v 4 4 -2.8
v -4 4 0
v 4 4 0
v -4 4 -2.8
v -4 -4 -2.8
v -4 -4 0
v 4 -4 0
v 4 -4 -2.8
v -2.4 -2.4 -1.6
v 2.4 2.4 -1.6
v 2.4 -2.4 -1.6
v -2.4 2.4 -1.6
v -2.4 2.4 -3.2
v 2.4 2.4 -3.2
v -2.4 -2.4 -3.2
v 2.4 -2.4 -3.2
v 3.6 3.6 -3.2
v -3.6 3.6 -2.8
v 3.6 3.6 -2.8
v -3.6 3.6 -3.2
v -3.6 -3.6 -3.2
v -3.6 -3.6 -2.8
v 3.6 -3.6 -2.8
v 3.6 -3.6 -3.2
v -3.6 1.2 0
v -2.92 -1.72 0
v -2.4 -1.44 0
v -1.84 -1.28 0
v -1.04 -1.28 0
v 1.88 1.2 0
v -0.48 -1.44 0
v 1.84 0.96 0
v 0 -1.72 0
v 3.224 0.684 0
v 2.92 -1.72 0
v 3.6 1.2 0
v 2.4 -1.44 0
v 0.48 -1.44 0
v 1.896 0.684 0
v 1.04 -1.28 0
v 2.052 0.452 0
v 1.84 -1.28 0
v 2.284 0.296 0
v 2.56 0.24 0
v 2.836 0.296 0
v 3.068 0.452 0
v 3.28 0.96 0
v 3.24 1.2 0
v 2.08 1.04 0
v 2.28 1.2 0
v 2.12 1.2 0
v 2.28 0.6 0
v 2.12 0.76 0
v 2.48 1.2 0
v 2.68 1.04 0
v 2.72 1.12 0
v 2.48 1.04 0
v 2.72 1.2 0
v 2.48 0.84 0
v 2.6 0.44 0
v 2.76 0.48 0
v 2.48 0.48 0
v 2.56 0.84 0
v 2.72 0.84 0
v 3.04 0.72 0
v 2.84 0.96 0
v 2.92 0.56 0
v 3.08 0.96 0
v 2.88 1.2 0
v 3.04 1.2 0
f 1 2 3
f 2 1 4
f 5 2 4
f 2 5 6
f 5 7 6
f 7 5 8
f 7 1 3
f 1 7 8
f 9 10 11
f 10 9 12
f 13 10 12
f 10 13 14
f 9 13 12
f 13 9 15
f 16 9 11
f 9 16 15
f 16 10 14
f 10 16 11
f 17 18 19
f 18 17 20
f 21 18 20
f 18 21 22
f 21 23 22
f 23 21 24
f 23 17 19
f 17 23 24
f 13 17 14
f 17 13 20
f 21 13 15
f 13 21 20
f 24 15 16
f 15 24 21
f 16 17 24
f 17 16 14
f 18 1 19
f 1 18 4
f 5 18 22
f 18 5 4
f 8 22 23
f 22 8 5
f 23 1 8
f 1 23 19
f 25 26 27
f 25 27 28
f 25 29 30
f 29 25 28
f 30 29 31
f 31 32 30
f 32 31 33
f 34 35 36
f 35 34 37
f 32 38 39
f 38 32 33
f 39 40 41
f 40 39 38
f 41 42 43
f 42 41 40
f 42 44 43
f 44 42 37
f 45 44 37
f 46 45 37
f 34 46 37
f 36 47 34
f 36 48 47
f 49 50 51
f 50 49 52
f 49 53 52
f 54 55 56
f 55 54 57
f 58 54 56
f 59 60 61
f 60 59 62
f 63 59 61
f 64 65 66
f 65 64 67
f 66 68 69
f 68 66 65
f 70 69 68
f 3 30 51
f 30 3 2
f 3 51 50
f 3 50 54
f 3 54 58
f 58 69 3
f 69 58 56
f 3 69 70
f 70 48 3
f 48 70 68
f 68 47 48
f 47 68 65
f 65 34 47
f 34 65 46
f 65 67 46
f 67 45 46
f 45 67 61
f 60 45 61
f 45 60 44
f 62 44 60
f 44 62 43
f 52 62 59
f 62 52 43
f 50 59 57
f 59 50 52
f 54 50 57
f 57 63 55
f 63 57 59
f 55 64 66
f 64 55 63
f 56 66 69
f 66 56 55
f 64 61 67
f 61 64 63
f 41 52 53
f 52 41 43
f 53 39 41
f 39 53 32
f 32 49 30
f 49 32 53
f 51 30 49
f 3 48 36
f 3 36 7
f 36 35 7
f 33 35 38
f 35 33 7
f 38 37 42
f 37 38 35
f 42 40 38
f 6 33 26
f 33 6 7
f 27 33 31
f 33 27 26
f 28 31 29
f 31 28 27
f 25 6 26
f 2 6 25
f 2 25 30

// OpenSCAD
// file: ../p/box5.scad
use <../lib.scad>
function ldraw_lib__box5() = [
// 0 Box with 5 Faces and All Edges
// 0 Name: box5.dat
// 0 Author: James Jessiman
// 0 !LDRAW_ORG Primitive UPDATE 2012-01
// 0 !LICENSE Licensed under CC BY 4.0 : see CAreadme.txt
// 
// 0 BFC CERTIFY CCW
  [0,"BFC","CERTIFY"],
  [0,"BFC","CCW"],
// 
// 0 !HISTORY 2002-04-03 [sbliss] Modified for BFC compliance
// 0 !HISTORY 2002-04-25 [PTadmin] Official Update 2002-02
// 0 !HISTORY 2007-06-24 [PTadmin] Header formatted for Contributor Agreement
// 0 !HISTORY 2008-07-01 [PTadmin] Official Update 2008-01
// 0 !HISTORY 2012-02-16 [Philo] Changed to CCW
// 0 !HISTORY 2012-03-30 [PTadmin] Official Update 2012-01
// 
// 
// 2 24 1 1 1 -1 1 1
  [2,24,1,1,1,-1,1,1],
// 2 24 -1 1 1 -1 1 -1
  [2,24,-1,1,1,-1,1,-1],
// 2 24 -1 1 -1 1 1 -1
  [2,24,-1,1,-1,1,1,-1],
// 2 24 1 1 -1 1 1 1
  [2,24,1,1,-1,1,1,1],
// 2 24 1 0 1 -1 0 1
  [2,24,1,0,1,-1,0,1],
// 2 24 -1 0 1 -1 0 -1
  [2,24,-1,0,1,-1,0,-1],
// 2 24 -1 0 -1 1 0 -1
  [2,24,-1,0,-1,1,0,-1],
// 2 24 1 0 -1 1 0 1
  [2,24,1,0,-1,1,0,1],
// 2 24 1 0 1 1 1 1
  [2,24,1,0,1,1,1,1],
// 2 24 -1 0 1 -1 1 1
  [2,24,-1,0,1,-1,1,1],
// 2 24 1 0 -1 1 1 -1
  [2,24,1,0,-1,1,1,-1],
// 2 24 -1 0 -1 -1 1 -1
  [2,24,-1,0,-1,-1,1,-1],
// 4 16 -1 1 1 1 1 1 1 1 -1 -1 1 -1
  [4,16,-1,1,1,1,1,1,1,1,-1,-1,1,-1],
// 4 16 -1 1 1 -1 0 1 1 0 1 1 1 1
  [4,16,-1,1,1,-1,0,1,1,0,1,1,1,1],
// 4 16 -1 1 -1 -1 0 -1 -1 0 1 -1 1 1
  [4,16,-1,1,-1,-1,0,-1,-1,0,1,-1,1,1],
// 4 16 1 1 -1 1 0 -1 -1 0 -1 -1 1 -1
  [4,16,1,1,-1,1,0,-1,-1,0,-1,-1,1,-1],
// 4 16 1 1 1 1 0 1 1 0 -1 1 1 -1
  [4,16,1,1,1,1,0,1,1,0,-1,1,1,-1],
];
module ldraw_lib__box5(step=0, col=false, unit=2/5, alt=false, line=0.2, solid=!$preview)
    makepoly(ldraw_lib__box5(), step=step, col=col, unit=unit, alt=alt, line=line, solid=solid);
ldraw_lib__box5(line=0.2);
// file: ../p/box4.scad
use <../lib.scad>
function ldraw_lib__box4() = [
// 0 Box with 4 Faces (2 Parallel Pairs) and All Edges
// 0 Name: box4.dat
// 0 Author: James Jessiman
// 0 !LDRAW_ORG Primitive UPDATE 2012-01
// 0 !LICENSE Licensed under CC BY 4.0 : see CAreadme.txt
// 
// 0 BFC CERTIFY CCW
  [0,"BFC","CERTIFY"],
  [0,"BFC","CCW"],
// 
// 0 !HISTORY 2002-04-03 [sbliss] Modified for BFC compliance
// 0 !HISTORY 2002-04-25 [PTadmin] Official Update 2002-02
// 0 !HISTORY 2007-06-24 [PTadmin] Header formatted for Contributor Agreement
// 0 !HISTORY 2008-07-01 [PTadmin] Official Update 2008-01
// 0 !HISTORY 2012-02-16 [Philo] Changed to CCW
// 0 !HISTORY 2012-03-30 [PTadmin] Official Update 2012-01
// 
// 
// 2 24 1 1 1 -1 1 1
  [2,24,1,1,1,-1,1,1],
// 2 24 -1 1 1 -1 1 -1
  [2,24,-1,1,1,-1,1,-1],
// 2 24 -1 1 -1 1 1 -1
  [2,24,-1,1,-1,1,1,-1],
// 2 24 1 1 -1 1 1 1
  [2,24,1,1,-1,1,1,1],
// 2 24 1 0 1 -1 0 1
  [2,24,1,0,1,-1,0,1],
// 2 24 -1 0 1 -1 0 -1
  [2,24,-1,0,1,-1,0,-1],
// 2 24 -1 0 -1 1 0 -1
  [2,24,-1,0,-1,1,0,-1],
// 2 24 1 0 -1 1 0 1
  [2,24,1,0,-1,1,0,1],
// 2 24 1 0 1 1 1 1
  [2,24,1,0,1,1,1,1],
// 2 24 -1 0 1 -1 1 1
  [2,24,-1,0,1,-1,1,1],
// 2 24 1 0 -1 1 1 -1
  [2,24,1,0,-1,1,1,-1],
// 2 24 -1 0 -1 -1 1 -1
  [2,24,-1,0,-1,-1,1,-1],
// 4 16 -1 1 1 -1 0 1 1 0 1 1 1 1
  [4,16,-1,1,1,-1,0,1,1,0,1,1,1,1],
// 4 16 -1 1 -1 -1 0 -1 -1 0 1 -1 1 1
  [4,16,-1,1,-1,-1,0,-1,-1,0,1,-1,1,1],
// 4 16 1 1 -1 1 0 -1 -1 0 -1 -1 1 -1
  [4,16,1,1,-1,1,0,-1,-1,0,-1,-1,1,-1],
// 4 16 1 1 1 1 0 1 1 0 -1 1 1 -1
  [4,16,1,1,1,1,0,1,1,0,-1,1,1,-1],
];
module ldraw_lib__box4(step=0, col=false, unit=2/5, alt=false, line=0.2, solid=!$preview)
    makepoly(ldraw_lib__box4(), step=step, col=col, unit=unit, alt=alt, line=line, solid=solid);
ldraw_lib__box4(line=0.2);
// file: s/3070bs01.scad
use <../../lib.scad>
use <../../p/box4.scad>
use <../../p/box5.scad>
function ldraw_lib__s__3070bs01() = [
// 0 ~Tile  1 x  1 with Groove without Top Face
// 0 Name: s\3070bs01.dat
// 0 Author: Chris Dee [cwdee]
// 0 !LDRAW_ORG Subpart UPDATE 2009-02
// 0 !LICENSE Licensed under CC BY 4.0 : see CAreadme.txt
// 
// 0 BFC CERTIFY CCW
  [0,"BFC","CERTIFY"],
  [0,"BFC","CCW"],
// 
// 0 !HISTORY 2009-09-03 [PTadmin] Official Update 2009-02
// 
// 
// 1 16 0 0 0 10 0 0 0 7 0 0 0 10 box4.dat
  [1,16,0,0,0,10,0,0,0,7,0,0,0,10, ldraw_lib__box4()],
// 0 BFC INVERTNEXT
  [0,"BFC","INVERTNEXT"],
// 1 16 0 8 0 6 0 0 0 -4 0 0 0 6 box5.dat
  [1,16,0,8,0,6,0,0,0,-4,0,0,0,6, ldraw_lib__box5()],
// 1 16 0 7 0 9 0 0 0 1 0 0 0 9 box4.dat
  [1,16,0,7,0,9,0,0,0,1,0,0,0,9, ldraw_lib__box4()],
// 
// 4 16 9 8 9 6 8 6 -6 8 6 -9 8 9
  [4,16,9,8,9,6,8,6,-6,8,6,-9,8,9],
// 4 16 -9 8 9 -6 8 6 -6 8 -6 -9 8 -9
  [4,16,-9,8,9,-6,8,6,-6,8,-6,-9,8,-9],
// 4 16 -9 8 -9 -6 8 -6 6 8 -6 9 8 -9
  [4,16,-9,8,-9,-6,8,-6,6,8,-6,9,8,-9],
// 4 16 9 8 -9 6 8 -6 6 8 6 9 8 9
  [4,16,9,8,-9,6,8,-6,6,8,6,9,8,9],
// 
// 4 16 10 7 10 9 7 9 -9 7 9 -10 7 10
  [4,16,10,7,10,9,7,9,-9,7,9,-10,7,10],
// 4 16 -10 7 10 -9 7 9 -9 7 -9 -10 7 -10
  [4,16,-10,7,10,-9,7,9,-9,7,-9,-10,7,-10],
// 4 16 -10 7 -10 -9 7 -9 9 7 -9 10 7 -10
  [4,16,-10,7,-10,-9,7,-9,9,7,-9,10,7,-10],
// 4 16 10 7 -10 9 7 -9 9 7 9 10 7 10
  [4,16,10,7,-10,9,7,-9,9,7,9,10,7,10],
// 0
];
module ldraw_lib__s__3070bs01(step=0, col=false, unit=2/5, alt=false, line=0.2, solid=!$preview)
    makepoly(ldraw_lib__s__3070bs01(), step=step, col=col, unit=unit, alt=alt, line=line, solid=solid);
ldraw_lib__s__3070bs01(line=0.2);
// main file
use <../lib.scad>
use <s/3070bs01.scad>
function ldraw_lib__3070bpt2() = [
// 0 Tile  1 x  1 with Red Levi's Logo Pattern
// 0 Name: 3070bpt2.dat
// 0 Author: Takeshi Takahashi [RainbowDolphin]
// 0 !LDRAW_ORG Part UPDATE 2024-08
// 0 !LICENSE Licensed under CC BY 4.0 : see CAreadme.txt
// 
// 0 BFC CERTIFY CCW
  [0,"BFC","CERTIFY"],
  [0,"BFC","CCW"],
// 
// 0 !KEYWORDS Bricklink 3070bpb181, Dots, Jeans, Rebrickable 3070bpr0233
// 0 !KEYWORDS Set 40438
// 
// 0 !HISTORY 2024-09-30 [OrionP] Official Update 2024-08
// 
// 
// 1 16 0 0 0 1 0 0 0 1 0 0 0 1 s\3070bs01.dat
  [1,16,0,0,0,1,0,0,0,1,0,0,0,1, ldraw_lib__s__3070bs01()],
// 3 4 -9 0 3 -7.3 0 -4.3 -6 0 -3.6
  [3,4,-9,0,3,-7.3,0,-4.3,-6,0,-3.6],
// 3 4 -9 0 3 -6 0 -3.6 -4.6 0 -3.2
  [3,4,-9,0,3,-6,0,-3.6,-4.6,0,-3.2],
// 4 4 -9 0 3 -4.6 0 -3.2 -2.6 0 -3.2 4.7 0 3
  [4,4,-9,0,3,-4.6,0,-3.2,-2.6,0,-3.2,4.7,0,3],
// 3 4 4.7 0 3 -2.6 0 -3.2 -1.2 0 -3.6
  [3,4,4.7,0,3,-2.6,0,-3.2,-1.2,0,-3.6],
// 4 4 4.7 0 3 -1.2 0 -3.6 0 0 -4.3 4.6 0 2.4
  [4,4,4.7,0,3,-1.2,0,-3.6,0,0,-4.3,4.6,0,2.4],
// 4 4 6 0 -3.6 7.3 0 -4.3 9 0 3 8.06 0 1.71
  [4,4,6,0,-3.6,7.3,0,-4.3,9,0,3,8.06,0,1.71],
// 4 4 4.6 0 2.4 0 0 -4.3 1.2 0 -3.6 4.74 0 1.71
  [4,4,4.6,0,2.4,0,0,-4.3,1.2,0,-3.6,4.74,0,1.71],
// 4 4 4.74 0 1.71 1.2 0 -3.6 2.6 0 -3.2 5.13 0 1.13
  [4,4,4.74,0,1.71,1.2,0,-3.6,2.6,0,-3.2,5.13,0,1.13],
// 4 4 5.13 0 1.13 2.6 0 -3.2 4.6 0 -3.2 5.71 0 0.74
  [4,4,5.13,0,1.13,2.6,0,-3.2,4.6,0,-3.2,5.71,0,0.74],
// 4 4 6.4 0 0.6 5.71 0 0.74 4.6 0 -3.2 6 0 -3.6
  [4,4,6.4,0,0.6,5.71,0,0.74,4.6,0,-3.2,6,0,-3.6],
// 3 4 7.09 0 0.74 6.4 0 0.6 6 0 -3.6
  [3,4,7.09,0,0.74,6.4,0,0.6,6,0,-3.6],
// 3 4 7.67 0 1.13 7.09 0 0.74 6 0 -3.6
  [3,4,7.67,0,1.13,7.09,0,0.74,6,0,-3.6],
// 3 4 8.06 0 1.71 7.67 0 1.13 6 0 -3.6
  [3,4,8.06,0,1.71,7.67,0,1.13,6,0,-3.6],
// 3 4 9 0 3 8.2 0 2.4 8.06 0 1.71
  [3,4,9,0,3,8.2,0,2.4,8.06,0,1.71],
// 3 4 9 0 3 8.1 0 3 8.2 0 2.4
  [3,4,9,0,3,8.1,0,3,8.2,0,2.4],
// 4 4 5.7 0 3 5.3 0 3 5.2 0 2.6 5.7 0 1.5
  [4,4,5.7,0,3,5.3,0,3,5.2,0,2.6,5.7,0,1.5],
// 3 4 5.2 0 2.6 5.3 0 1.9 5.7 0 1.5
  [3,4,5.2,0,2.6,5.3,0,1.9,5.7,0,1.5],
// 4 4 6.2 0 3 6.2 0 2.6 6.7 0 2.6 6.8 0 2.8
  [4,4,6.2,0,3,6.2,0,2.6,6.7,0,2.6,6.8,0,2.8],
// 3 4 6.8 0 3 6.2 0 3 6.8 0 2.8
  [3,4,6.8,0,3,6.2,0,3,6.8,0,2.8],
// 4 4 6.2 0 2.1 6.2 0 1.2 6.5 0 1.1 6.9 0 1.2
  [4,4,6.2,0,2.1,6.2,0,1.2,6.5,0,1.1,6.9,0,1.2],
// 3 4 6.4 0 2.1 6.2 0 2.1 6.9 0 1.2
  [3,4,6.4,0,2.1,6.2,0,2.1,6.9,0,1.2],
// 4 4 6.8 0 2.1 7.3 0 1.4 7.6 0 1.8 7.1 0 2.4
  [4,4,6.8,0,2.1,7.3,0,1.4,7.6,0,1.8,7.1,0,2.4],
// 4 4 7.1 0 2.4 7.6 0 1.8 7.7 0 2.4 7.2 0 3
  [4,4,7.1,0,2.4,7.6,0,1.8,7.7,0,2.4,7.2,0,3],
// 3 4 7.6 0 3 7.2 0 3 7.7 0 2.4
  [3,4,7.6,0,3,7.2,0,3,7.7,0,2.4],
// 4 16 10 0 10 -10 0 10 4.7 0 3 5.3 0 3
  [4,16,10,0,10,-10,0,10,4.7,0,3,5.3,0,3],
// 3 16 10 0 10 5.3 0 3 5.7 0 3
  [3,16,10,0,10,5.3,0,3,5.7,0,3],
// 3 16 10 0 10 5.7 0 3 6.2 0 3
  [3,16,10,0,10,5.7,0,3,6.2,0,3],
// 3 16 10 0 10 6.2 0 3 6.8 0 3
  [3,16,10,0,10,6.2,0,3,6.8,0,3],
// 4 16 7.2 0 3 10 0 10 6.8 0 3 6.8 0 2.8
  [4,16,7.2,0,3,10,0,10,6.8,0,3,6.8,0,2.8],
// 3 16 10 0 10 7.2 0 3 7.6 0 3
  [3,16,10,0,10,7.2,0,3,7.6,0,3],
// 4 16 8.1 0 3 10 0 10 7.6 0 3 7.7 0 2.4
  [4,16,8.1,0,3,10,0,10,7.6,0,3,7.7,0,2.4],
// 4 16 8.2 0 2.4 8.1 0 3 7.7 0 2.4 7.6 0 1.8
  [4,16,8.2,0,2.4,8.1,0,3,7.7,0,2.4,7.6,0,1.8],
// 4 16 8.06 0 1.71 8.2 0 2.4 7.6 0 1.8 7.67 0 1.13
  [4,16,8.06,0,1.71,8.2,0,2.4,7.6,0,1.8,7.67,0,1.13],
// 3 16 7.6 0 1.8 7.3 0 1.4 7.67 0 1.13
  [3,16,7.6,0,1.8,7.3,0,1.4,7.67,0,1.13],
// 4 16 7.67 0 1.13 7.3 0 1.4 6.9 0 1.2 7.09 0 0.74
  [4,16,7.67,0,1.13,7.3,0,1.4,6.9,0,1.2,7.09,0,0.74],
// 4 16 7.09 0 0.74 6.9 0 1.2 6.5 0 1.1 6.4 0 0.6
  [4,16,7.09,0,0.74,6.9,0,1.2,6.5,0,1.1,6.4,0,0.6],
// 4 16 6.4 0 0.6 6.5 0 1.1 6.2 0 1.2 5.71 0 0.74
  [4,16,6.4,0,0.6,6.5,0,1.1,6.2,0,1.2,5.71,0,0.74],
// 4 16 5.7 0 1.5 5.71 0 0.74 6.2 0 1.2 6.2 0 2.1
  [4,16,5.7,0,1.5,5.71,0,0.74,6.2,0,1.2,6.2,0,2.1],
// 4 16 5.7 0 1.5 6.2 0 2.1 6.2 0 2.6 5.7 0 3
  [4,16,5.7,0,1.5,6.2,0,2.1,6.2,0,2.6,5.7,0,3],
// 3 16 6.2 0 3 5.7 0 3 6.2 0 2.6
  [3,16,6.2,0,3,5.7,0,3,6.2,0,2.6],
// 4 16 6.2 0 2.6 6.2 0 2.1 6.4 0 2.1 6.7 0 2.6
  [4,16,6.2,0,2.6,6.2,0,2.1,6.4,0,2.1,6.7,0,2.6],
// 4 16 6.7 0 2.6 6.4 0 2.1 6.8 0 2.1 7.1 0 2.4
  [4,16,6.7,0,2.6,6.4,0,2.1,6.8,0,2.1,7.1,0,2.4],
// 4 16 6.8 0 2.8 6.7 0 2.6 7.1 0 2.4 7.2 0 3
  [4,16,6.8,0,2.8,6.7,0,2.6,7.1,0,2.4,7.2,0,3],
// 4 16 6.8 0 2.1 6.4 0 2.1 6.9 0 1.2 7.3 0 1.4
  [4,16,6.8,0,2.1,6.4,0,2.1,6.9,0,1.2,7.3,0,1.4],
// 4 16 5.13 0 1.13 5.71 0 0.74 5.7 0 1.5 5.3 0 1.9
  [4,16,5.13,0,1.13,5.71,0,0.74,5.7,0,1.5,5.3,0,1.9],
// 4 16 4.74 0 1.71 5.13 0 1.13 5.3 0 1.9 4.6 0 2.4
  [4,16,4.74,0,1.71,5.13,0,1.13,5.3,0,1.9,4.6,0,2.4],
// 4 16 4.6 0 2.4 5.3 0 1.9 5.2 0 2.6 4.7 0 3
  [4,16,4.6,0,2.4,5.3,0,1.9,5.2,0,2.6,4.7,0,3],
// 3 16 5.3 0 3 4.7 0 3 5.2 0 2.6
  [3,16,5.3,0,3,4.7,0,3,5.2,0,2.6],
// 3 16 10 0 10 8.1 0 3 9 0 3
  [3,16,10,0,10,8.1,0,3,9,0,3],
// 3 16 10 0 10 9 0 3 10 0 -10
  [3,16,10,0,10,9,0,3,10,0,-10],
// 3 16 9 0 3 7.3 0 -4.3 10 0 -10
  [3,16,9,0,3,7.3,0,-4.3,10,0,-10],
// 4 16 0 0 -4.3 10 0 -10 7.3 0 -4.3 1.2 0 -3.6
  [4,16,0,0,-4.3,10,0,-10,7.3,0,-4.3,1.2,0,-3.6],
// 4 16 1.2 0 -3.6 7.3 0 -4.3 6 0 -3.6 4.6 0 -3.2
  [4,16,1.2,0,-3.6,7.3,0,-4.3,6,0,-3.6,4.6,0,-3.2],
// 3 16 4.6 0 -3.2 2.6 0 -3.2 1.2 0 -3.6
  [3,16,4.6,0,-3.2,2.6,0,-3.2,1.2,0,-3.6],
// 4 16 -10 0 -10 10 0 -10 0 0 -4.3 -7.3 0 -4.3
  [4,16,-10,0,-10,10,0,-10,0,0,-4.3,-7.3,0,-4.3],
// 4 16 -6 0 -3.6 -7.3 0 -4.3 0 0 -4.3 -1.2 0 -3.6
  [4,16,-6,0,-3.6,-7.3,0,-4.3,0,0,-4.3,-1.2,0,-3.6],
// 4 16 -4.6 0 -3.2 -6 0 -3.6 -1.2 0 -3.6 -2.6 0 -3.2
  [4,16,-4.6,0,-3.2,-6,0,-3.6,-1.2,0,-3.6,-2.6,0,-3.2],
// 3 16 -9 0 3 -10 0 -10 -7.3 0 -4.3
  [3,16,-9,0,3,-10,0,-10,-7.3,0,-4.3],
// 3 16 -10 0 10 -10 0 -10 -9 0 3
  [3,16,-10,0,10,-10,0,-10,-9,0,3],
// 3 16 -10 0 10 -9 0 3 4.7 0 3
  [3,16,-10,0,10,-9,0,3,4.7,0,3],
];
module ldraw_lib__3070bpt2(step=0, col=false, unit=2/5, alt=false, line=0.2, solid=!$preview)
    makepoly(ldraw_lib__3070bpt2(), step=step, col=col, unit=unit, alt=alt, line=line, solid=solid);
ldraw_lib__3070bpt2(line=0.2);
